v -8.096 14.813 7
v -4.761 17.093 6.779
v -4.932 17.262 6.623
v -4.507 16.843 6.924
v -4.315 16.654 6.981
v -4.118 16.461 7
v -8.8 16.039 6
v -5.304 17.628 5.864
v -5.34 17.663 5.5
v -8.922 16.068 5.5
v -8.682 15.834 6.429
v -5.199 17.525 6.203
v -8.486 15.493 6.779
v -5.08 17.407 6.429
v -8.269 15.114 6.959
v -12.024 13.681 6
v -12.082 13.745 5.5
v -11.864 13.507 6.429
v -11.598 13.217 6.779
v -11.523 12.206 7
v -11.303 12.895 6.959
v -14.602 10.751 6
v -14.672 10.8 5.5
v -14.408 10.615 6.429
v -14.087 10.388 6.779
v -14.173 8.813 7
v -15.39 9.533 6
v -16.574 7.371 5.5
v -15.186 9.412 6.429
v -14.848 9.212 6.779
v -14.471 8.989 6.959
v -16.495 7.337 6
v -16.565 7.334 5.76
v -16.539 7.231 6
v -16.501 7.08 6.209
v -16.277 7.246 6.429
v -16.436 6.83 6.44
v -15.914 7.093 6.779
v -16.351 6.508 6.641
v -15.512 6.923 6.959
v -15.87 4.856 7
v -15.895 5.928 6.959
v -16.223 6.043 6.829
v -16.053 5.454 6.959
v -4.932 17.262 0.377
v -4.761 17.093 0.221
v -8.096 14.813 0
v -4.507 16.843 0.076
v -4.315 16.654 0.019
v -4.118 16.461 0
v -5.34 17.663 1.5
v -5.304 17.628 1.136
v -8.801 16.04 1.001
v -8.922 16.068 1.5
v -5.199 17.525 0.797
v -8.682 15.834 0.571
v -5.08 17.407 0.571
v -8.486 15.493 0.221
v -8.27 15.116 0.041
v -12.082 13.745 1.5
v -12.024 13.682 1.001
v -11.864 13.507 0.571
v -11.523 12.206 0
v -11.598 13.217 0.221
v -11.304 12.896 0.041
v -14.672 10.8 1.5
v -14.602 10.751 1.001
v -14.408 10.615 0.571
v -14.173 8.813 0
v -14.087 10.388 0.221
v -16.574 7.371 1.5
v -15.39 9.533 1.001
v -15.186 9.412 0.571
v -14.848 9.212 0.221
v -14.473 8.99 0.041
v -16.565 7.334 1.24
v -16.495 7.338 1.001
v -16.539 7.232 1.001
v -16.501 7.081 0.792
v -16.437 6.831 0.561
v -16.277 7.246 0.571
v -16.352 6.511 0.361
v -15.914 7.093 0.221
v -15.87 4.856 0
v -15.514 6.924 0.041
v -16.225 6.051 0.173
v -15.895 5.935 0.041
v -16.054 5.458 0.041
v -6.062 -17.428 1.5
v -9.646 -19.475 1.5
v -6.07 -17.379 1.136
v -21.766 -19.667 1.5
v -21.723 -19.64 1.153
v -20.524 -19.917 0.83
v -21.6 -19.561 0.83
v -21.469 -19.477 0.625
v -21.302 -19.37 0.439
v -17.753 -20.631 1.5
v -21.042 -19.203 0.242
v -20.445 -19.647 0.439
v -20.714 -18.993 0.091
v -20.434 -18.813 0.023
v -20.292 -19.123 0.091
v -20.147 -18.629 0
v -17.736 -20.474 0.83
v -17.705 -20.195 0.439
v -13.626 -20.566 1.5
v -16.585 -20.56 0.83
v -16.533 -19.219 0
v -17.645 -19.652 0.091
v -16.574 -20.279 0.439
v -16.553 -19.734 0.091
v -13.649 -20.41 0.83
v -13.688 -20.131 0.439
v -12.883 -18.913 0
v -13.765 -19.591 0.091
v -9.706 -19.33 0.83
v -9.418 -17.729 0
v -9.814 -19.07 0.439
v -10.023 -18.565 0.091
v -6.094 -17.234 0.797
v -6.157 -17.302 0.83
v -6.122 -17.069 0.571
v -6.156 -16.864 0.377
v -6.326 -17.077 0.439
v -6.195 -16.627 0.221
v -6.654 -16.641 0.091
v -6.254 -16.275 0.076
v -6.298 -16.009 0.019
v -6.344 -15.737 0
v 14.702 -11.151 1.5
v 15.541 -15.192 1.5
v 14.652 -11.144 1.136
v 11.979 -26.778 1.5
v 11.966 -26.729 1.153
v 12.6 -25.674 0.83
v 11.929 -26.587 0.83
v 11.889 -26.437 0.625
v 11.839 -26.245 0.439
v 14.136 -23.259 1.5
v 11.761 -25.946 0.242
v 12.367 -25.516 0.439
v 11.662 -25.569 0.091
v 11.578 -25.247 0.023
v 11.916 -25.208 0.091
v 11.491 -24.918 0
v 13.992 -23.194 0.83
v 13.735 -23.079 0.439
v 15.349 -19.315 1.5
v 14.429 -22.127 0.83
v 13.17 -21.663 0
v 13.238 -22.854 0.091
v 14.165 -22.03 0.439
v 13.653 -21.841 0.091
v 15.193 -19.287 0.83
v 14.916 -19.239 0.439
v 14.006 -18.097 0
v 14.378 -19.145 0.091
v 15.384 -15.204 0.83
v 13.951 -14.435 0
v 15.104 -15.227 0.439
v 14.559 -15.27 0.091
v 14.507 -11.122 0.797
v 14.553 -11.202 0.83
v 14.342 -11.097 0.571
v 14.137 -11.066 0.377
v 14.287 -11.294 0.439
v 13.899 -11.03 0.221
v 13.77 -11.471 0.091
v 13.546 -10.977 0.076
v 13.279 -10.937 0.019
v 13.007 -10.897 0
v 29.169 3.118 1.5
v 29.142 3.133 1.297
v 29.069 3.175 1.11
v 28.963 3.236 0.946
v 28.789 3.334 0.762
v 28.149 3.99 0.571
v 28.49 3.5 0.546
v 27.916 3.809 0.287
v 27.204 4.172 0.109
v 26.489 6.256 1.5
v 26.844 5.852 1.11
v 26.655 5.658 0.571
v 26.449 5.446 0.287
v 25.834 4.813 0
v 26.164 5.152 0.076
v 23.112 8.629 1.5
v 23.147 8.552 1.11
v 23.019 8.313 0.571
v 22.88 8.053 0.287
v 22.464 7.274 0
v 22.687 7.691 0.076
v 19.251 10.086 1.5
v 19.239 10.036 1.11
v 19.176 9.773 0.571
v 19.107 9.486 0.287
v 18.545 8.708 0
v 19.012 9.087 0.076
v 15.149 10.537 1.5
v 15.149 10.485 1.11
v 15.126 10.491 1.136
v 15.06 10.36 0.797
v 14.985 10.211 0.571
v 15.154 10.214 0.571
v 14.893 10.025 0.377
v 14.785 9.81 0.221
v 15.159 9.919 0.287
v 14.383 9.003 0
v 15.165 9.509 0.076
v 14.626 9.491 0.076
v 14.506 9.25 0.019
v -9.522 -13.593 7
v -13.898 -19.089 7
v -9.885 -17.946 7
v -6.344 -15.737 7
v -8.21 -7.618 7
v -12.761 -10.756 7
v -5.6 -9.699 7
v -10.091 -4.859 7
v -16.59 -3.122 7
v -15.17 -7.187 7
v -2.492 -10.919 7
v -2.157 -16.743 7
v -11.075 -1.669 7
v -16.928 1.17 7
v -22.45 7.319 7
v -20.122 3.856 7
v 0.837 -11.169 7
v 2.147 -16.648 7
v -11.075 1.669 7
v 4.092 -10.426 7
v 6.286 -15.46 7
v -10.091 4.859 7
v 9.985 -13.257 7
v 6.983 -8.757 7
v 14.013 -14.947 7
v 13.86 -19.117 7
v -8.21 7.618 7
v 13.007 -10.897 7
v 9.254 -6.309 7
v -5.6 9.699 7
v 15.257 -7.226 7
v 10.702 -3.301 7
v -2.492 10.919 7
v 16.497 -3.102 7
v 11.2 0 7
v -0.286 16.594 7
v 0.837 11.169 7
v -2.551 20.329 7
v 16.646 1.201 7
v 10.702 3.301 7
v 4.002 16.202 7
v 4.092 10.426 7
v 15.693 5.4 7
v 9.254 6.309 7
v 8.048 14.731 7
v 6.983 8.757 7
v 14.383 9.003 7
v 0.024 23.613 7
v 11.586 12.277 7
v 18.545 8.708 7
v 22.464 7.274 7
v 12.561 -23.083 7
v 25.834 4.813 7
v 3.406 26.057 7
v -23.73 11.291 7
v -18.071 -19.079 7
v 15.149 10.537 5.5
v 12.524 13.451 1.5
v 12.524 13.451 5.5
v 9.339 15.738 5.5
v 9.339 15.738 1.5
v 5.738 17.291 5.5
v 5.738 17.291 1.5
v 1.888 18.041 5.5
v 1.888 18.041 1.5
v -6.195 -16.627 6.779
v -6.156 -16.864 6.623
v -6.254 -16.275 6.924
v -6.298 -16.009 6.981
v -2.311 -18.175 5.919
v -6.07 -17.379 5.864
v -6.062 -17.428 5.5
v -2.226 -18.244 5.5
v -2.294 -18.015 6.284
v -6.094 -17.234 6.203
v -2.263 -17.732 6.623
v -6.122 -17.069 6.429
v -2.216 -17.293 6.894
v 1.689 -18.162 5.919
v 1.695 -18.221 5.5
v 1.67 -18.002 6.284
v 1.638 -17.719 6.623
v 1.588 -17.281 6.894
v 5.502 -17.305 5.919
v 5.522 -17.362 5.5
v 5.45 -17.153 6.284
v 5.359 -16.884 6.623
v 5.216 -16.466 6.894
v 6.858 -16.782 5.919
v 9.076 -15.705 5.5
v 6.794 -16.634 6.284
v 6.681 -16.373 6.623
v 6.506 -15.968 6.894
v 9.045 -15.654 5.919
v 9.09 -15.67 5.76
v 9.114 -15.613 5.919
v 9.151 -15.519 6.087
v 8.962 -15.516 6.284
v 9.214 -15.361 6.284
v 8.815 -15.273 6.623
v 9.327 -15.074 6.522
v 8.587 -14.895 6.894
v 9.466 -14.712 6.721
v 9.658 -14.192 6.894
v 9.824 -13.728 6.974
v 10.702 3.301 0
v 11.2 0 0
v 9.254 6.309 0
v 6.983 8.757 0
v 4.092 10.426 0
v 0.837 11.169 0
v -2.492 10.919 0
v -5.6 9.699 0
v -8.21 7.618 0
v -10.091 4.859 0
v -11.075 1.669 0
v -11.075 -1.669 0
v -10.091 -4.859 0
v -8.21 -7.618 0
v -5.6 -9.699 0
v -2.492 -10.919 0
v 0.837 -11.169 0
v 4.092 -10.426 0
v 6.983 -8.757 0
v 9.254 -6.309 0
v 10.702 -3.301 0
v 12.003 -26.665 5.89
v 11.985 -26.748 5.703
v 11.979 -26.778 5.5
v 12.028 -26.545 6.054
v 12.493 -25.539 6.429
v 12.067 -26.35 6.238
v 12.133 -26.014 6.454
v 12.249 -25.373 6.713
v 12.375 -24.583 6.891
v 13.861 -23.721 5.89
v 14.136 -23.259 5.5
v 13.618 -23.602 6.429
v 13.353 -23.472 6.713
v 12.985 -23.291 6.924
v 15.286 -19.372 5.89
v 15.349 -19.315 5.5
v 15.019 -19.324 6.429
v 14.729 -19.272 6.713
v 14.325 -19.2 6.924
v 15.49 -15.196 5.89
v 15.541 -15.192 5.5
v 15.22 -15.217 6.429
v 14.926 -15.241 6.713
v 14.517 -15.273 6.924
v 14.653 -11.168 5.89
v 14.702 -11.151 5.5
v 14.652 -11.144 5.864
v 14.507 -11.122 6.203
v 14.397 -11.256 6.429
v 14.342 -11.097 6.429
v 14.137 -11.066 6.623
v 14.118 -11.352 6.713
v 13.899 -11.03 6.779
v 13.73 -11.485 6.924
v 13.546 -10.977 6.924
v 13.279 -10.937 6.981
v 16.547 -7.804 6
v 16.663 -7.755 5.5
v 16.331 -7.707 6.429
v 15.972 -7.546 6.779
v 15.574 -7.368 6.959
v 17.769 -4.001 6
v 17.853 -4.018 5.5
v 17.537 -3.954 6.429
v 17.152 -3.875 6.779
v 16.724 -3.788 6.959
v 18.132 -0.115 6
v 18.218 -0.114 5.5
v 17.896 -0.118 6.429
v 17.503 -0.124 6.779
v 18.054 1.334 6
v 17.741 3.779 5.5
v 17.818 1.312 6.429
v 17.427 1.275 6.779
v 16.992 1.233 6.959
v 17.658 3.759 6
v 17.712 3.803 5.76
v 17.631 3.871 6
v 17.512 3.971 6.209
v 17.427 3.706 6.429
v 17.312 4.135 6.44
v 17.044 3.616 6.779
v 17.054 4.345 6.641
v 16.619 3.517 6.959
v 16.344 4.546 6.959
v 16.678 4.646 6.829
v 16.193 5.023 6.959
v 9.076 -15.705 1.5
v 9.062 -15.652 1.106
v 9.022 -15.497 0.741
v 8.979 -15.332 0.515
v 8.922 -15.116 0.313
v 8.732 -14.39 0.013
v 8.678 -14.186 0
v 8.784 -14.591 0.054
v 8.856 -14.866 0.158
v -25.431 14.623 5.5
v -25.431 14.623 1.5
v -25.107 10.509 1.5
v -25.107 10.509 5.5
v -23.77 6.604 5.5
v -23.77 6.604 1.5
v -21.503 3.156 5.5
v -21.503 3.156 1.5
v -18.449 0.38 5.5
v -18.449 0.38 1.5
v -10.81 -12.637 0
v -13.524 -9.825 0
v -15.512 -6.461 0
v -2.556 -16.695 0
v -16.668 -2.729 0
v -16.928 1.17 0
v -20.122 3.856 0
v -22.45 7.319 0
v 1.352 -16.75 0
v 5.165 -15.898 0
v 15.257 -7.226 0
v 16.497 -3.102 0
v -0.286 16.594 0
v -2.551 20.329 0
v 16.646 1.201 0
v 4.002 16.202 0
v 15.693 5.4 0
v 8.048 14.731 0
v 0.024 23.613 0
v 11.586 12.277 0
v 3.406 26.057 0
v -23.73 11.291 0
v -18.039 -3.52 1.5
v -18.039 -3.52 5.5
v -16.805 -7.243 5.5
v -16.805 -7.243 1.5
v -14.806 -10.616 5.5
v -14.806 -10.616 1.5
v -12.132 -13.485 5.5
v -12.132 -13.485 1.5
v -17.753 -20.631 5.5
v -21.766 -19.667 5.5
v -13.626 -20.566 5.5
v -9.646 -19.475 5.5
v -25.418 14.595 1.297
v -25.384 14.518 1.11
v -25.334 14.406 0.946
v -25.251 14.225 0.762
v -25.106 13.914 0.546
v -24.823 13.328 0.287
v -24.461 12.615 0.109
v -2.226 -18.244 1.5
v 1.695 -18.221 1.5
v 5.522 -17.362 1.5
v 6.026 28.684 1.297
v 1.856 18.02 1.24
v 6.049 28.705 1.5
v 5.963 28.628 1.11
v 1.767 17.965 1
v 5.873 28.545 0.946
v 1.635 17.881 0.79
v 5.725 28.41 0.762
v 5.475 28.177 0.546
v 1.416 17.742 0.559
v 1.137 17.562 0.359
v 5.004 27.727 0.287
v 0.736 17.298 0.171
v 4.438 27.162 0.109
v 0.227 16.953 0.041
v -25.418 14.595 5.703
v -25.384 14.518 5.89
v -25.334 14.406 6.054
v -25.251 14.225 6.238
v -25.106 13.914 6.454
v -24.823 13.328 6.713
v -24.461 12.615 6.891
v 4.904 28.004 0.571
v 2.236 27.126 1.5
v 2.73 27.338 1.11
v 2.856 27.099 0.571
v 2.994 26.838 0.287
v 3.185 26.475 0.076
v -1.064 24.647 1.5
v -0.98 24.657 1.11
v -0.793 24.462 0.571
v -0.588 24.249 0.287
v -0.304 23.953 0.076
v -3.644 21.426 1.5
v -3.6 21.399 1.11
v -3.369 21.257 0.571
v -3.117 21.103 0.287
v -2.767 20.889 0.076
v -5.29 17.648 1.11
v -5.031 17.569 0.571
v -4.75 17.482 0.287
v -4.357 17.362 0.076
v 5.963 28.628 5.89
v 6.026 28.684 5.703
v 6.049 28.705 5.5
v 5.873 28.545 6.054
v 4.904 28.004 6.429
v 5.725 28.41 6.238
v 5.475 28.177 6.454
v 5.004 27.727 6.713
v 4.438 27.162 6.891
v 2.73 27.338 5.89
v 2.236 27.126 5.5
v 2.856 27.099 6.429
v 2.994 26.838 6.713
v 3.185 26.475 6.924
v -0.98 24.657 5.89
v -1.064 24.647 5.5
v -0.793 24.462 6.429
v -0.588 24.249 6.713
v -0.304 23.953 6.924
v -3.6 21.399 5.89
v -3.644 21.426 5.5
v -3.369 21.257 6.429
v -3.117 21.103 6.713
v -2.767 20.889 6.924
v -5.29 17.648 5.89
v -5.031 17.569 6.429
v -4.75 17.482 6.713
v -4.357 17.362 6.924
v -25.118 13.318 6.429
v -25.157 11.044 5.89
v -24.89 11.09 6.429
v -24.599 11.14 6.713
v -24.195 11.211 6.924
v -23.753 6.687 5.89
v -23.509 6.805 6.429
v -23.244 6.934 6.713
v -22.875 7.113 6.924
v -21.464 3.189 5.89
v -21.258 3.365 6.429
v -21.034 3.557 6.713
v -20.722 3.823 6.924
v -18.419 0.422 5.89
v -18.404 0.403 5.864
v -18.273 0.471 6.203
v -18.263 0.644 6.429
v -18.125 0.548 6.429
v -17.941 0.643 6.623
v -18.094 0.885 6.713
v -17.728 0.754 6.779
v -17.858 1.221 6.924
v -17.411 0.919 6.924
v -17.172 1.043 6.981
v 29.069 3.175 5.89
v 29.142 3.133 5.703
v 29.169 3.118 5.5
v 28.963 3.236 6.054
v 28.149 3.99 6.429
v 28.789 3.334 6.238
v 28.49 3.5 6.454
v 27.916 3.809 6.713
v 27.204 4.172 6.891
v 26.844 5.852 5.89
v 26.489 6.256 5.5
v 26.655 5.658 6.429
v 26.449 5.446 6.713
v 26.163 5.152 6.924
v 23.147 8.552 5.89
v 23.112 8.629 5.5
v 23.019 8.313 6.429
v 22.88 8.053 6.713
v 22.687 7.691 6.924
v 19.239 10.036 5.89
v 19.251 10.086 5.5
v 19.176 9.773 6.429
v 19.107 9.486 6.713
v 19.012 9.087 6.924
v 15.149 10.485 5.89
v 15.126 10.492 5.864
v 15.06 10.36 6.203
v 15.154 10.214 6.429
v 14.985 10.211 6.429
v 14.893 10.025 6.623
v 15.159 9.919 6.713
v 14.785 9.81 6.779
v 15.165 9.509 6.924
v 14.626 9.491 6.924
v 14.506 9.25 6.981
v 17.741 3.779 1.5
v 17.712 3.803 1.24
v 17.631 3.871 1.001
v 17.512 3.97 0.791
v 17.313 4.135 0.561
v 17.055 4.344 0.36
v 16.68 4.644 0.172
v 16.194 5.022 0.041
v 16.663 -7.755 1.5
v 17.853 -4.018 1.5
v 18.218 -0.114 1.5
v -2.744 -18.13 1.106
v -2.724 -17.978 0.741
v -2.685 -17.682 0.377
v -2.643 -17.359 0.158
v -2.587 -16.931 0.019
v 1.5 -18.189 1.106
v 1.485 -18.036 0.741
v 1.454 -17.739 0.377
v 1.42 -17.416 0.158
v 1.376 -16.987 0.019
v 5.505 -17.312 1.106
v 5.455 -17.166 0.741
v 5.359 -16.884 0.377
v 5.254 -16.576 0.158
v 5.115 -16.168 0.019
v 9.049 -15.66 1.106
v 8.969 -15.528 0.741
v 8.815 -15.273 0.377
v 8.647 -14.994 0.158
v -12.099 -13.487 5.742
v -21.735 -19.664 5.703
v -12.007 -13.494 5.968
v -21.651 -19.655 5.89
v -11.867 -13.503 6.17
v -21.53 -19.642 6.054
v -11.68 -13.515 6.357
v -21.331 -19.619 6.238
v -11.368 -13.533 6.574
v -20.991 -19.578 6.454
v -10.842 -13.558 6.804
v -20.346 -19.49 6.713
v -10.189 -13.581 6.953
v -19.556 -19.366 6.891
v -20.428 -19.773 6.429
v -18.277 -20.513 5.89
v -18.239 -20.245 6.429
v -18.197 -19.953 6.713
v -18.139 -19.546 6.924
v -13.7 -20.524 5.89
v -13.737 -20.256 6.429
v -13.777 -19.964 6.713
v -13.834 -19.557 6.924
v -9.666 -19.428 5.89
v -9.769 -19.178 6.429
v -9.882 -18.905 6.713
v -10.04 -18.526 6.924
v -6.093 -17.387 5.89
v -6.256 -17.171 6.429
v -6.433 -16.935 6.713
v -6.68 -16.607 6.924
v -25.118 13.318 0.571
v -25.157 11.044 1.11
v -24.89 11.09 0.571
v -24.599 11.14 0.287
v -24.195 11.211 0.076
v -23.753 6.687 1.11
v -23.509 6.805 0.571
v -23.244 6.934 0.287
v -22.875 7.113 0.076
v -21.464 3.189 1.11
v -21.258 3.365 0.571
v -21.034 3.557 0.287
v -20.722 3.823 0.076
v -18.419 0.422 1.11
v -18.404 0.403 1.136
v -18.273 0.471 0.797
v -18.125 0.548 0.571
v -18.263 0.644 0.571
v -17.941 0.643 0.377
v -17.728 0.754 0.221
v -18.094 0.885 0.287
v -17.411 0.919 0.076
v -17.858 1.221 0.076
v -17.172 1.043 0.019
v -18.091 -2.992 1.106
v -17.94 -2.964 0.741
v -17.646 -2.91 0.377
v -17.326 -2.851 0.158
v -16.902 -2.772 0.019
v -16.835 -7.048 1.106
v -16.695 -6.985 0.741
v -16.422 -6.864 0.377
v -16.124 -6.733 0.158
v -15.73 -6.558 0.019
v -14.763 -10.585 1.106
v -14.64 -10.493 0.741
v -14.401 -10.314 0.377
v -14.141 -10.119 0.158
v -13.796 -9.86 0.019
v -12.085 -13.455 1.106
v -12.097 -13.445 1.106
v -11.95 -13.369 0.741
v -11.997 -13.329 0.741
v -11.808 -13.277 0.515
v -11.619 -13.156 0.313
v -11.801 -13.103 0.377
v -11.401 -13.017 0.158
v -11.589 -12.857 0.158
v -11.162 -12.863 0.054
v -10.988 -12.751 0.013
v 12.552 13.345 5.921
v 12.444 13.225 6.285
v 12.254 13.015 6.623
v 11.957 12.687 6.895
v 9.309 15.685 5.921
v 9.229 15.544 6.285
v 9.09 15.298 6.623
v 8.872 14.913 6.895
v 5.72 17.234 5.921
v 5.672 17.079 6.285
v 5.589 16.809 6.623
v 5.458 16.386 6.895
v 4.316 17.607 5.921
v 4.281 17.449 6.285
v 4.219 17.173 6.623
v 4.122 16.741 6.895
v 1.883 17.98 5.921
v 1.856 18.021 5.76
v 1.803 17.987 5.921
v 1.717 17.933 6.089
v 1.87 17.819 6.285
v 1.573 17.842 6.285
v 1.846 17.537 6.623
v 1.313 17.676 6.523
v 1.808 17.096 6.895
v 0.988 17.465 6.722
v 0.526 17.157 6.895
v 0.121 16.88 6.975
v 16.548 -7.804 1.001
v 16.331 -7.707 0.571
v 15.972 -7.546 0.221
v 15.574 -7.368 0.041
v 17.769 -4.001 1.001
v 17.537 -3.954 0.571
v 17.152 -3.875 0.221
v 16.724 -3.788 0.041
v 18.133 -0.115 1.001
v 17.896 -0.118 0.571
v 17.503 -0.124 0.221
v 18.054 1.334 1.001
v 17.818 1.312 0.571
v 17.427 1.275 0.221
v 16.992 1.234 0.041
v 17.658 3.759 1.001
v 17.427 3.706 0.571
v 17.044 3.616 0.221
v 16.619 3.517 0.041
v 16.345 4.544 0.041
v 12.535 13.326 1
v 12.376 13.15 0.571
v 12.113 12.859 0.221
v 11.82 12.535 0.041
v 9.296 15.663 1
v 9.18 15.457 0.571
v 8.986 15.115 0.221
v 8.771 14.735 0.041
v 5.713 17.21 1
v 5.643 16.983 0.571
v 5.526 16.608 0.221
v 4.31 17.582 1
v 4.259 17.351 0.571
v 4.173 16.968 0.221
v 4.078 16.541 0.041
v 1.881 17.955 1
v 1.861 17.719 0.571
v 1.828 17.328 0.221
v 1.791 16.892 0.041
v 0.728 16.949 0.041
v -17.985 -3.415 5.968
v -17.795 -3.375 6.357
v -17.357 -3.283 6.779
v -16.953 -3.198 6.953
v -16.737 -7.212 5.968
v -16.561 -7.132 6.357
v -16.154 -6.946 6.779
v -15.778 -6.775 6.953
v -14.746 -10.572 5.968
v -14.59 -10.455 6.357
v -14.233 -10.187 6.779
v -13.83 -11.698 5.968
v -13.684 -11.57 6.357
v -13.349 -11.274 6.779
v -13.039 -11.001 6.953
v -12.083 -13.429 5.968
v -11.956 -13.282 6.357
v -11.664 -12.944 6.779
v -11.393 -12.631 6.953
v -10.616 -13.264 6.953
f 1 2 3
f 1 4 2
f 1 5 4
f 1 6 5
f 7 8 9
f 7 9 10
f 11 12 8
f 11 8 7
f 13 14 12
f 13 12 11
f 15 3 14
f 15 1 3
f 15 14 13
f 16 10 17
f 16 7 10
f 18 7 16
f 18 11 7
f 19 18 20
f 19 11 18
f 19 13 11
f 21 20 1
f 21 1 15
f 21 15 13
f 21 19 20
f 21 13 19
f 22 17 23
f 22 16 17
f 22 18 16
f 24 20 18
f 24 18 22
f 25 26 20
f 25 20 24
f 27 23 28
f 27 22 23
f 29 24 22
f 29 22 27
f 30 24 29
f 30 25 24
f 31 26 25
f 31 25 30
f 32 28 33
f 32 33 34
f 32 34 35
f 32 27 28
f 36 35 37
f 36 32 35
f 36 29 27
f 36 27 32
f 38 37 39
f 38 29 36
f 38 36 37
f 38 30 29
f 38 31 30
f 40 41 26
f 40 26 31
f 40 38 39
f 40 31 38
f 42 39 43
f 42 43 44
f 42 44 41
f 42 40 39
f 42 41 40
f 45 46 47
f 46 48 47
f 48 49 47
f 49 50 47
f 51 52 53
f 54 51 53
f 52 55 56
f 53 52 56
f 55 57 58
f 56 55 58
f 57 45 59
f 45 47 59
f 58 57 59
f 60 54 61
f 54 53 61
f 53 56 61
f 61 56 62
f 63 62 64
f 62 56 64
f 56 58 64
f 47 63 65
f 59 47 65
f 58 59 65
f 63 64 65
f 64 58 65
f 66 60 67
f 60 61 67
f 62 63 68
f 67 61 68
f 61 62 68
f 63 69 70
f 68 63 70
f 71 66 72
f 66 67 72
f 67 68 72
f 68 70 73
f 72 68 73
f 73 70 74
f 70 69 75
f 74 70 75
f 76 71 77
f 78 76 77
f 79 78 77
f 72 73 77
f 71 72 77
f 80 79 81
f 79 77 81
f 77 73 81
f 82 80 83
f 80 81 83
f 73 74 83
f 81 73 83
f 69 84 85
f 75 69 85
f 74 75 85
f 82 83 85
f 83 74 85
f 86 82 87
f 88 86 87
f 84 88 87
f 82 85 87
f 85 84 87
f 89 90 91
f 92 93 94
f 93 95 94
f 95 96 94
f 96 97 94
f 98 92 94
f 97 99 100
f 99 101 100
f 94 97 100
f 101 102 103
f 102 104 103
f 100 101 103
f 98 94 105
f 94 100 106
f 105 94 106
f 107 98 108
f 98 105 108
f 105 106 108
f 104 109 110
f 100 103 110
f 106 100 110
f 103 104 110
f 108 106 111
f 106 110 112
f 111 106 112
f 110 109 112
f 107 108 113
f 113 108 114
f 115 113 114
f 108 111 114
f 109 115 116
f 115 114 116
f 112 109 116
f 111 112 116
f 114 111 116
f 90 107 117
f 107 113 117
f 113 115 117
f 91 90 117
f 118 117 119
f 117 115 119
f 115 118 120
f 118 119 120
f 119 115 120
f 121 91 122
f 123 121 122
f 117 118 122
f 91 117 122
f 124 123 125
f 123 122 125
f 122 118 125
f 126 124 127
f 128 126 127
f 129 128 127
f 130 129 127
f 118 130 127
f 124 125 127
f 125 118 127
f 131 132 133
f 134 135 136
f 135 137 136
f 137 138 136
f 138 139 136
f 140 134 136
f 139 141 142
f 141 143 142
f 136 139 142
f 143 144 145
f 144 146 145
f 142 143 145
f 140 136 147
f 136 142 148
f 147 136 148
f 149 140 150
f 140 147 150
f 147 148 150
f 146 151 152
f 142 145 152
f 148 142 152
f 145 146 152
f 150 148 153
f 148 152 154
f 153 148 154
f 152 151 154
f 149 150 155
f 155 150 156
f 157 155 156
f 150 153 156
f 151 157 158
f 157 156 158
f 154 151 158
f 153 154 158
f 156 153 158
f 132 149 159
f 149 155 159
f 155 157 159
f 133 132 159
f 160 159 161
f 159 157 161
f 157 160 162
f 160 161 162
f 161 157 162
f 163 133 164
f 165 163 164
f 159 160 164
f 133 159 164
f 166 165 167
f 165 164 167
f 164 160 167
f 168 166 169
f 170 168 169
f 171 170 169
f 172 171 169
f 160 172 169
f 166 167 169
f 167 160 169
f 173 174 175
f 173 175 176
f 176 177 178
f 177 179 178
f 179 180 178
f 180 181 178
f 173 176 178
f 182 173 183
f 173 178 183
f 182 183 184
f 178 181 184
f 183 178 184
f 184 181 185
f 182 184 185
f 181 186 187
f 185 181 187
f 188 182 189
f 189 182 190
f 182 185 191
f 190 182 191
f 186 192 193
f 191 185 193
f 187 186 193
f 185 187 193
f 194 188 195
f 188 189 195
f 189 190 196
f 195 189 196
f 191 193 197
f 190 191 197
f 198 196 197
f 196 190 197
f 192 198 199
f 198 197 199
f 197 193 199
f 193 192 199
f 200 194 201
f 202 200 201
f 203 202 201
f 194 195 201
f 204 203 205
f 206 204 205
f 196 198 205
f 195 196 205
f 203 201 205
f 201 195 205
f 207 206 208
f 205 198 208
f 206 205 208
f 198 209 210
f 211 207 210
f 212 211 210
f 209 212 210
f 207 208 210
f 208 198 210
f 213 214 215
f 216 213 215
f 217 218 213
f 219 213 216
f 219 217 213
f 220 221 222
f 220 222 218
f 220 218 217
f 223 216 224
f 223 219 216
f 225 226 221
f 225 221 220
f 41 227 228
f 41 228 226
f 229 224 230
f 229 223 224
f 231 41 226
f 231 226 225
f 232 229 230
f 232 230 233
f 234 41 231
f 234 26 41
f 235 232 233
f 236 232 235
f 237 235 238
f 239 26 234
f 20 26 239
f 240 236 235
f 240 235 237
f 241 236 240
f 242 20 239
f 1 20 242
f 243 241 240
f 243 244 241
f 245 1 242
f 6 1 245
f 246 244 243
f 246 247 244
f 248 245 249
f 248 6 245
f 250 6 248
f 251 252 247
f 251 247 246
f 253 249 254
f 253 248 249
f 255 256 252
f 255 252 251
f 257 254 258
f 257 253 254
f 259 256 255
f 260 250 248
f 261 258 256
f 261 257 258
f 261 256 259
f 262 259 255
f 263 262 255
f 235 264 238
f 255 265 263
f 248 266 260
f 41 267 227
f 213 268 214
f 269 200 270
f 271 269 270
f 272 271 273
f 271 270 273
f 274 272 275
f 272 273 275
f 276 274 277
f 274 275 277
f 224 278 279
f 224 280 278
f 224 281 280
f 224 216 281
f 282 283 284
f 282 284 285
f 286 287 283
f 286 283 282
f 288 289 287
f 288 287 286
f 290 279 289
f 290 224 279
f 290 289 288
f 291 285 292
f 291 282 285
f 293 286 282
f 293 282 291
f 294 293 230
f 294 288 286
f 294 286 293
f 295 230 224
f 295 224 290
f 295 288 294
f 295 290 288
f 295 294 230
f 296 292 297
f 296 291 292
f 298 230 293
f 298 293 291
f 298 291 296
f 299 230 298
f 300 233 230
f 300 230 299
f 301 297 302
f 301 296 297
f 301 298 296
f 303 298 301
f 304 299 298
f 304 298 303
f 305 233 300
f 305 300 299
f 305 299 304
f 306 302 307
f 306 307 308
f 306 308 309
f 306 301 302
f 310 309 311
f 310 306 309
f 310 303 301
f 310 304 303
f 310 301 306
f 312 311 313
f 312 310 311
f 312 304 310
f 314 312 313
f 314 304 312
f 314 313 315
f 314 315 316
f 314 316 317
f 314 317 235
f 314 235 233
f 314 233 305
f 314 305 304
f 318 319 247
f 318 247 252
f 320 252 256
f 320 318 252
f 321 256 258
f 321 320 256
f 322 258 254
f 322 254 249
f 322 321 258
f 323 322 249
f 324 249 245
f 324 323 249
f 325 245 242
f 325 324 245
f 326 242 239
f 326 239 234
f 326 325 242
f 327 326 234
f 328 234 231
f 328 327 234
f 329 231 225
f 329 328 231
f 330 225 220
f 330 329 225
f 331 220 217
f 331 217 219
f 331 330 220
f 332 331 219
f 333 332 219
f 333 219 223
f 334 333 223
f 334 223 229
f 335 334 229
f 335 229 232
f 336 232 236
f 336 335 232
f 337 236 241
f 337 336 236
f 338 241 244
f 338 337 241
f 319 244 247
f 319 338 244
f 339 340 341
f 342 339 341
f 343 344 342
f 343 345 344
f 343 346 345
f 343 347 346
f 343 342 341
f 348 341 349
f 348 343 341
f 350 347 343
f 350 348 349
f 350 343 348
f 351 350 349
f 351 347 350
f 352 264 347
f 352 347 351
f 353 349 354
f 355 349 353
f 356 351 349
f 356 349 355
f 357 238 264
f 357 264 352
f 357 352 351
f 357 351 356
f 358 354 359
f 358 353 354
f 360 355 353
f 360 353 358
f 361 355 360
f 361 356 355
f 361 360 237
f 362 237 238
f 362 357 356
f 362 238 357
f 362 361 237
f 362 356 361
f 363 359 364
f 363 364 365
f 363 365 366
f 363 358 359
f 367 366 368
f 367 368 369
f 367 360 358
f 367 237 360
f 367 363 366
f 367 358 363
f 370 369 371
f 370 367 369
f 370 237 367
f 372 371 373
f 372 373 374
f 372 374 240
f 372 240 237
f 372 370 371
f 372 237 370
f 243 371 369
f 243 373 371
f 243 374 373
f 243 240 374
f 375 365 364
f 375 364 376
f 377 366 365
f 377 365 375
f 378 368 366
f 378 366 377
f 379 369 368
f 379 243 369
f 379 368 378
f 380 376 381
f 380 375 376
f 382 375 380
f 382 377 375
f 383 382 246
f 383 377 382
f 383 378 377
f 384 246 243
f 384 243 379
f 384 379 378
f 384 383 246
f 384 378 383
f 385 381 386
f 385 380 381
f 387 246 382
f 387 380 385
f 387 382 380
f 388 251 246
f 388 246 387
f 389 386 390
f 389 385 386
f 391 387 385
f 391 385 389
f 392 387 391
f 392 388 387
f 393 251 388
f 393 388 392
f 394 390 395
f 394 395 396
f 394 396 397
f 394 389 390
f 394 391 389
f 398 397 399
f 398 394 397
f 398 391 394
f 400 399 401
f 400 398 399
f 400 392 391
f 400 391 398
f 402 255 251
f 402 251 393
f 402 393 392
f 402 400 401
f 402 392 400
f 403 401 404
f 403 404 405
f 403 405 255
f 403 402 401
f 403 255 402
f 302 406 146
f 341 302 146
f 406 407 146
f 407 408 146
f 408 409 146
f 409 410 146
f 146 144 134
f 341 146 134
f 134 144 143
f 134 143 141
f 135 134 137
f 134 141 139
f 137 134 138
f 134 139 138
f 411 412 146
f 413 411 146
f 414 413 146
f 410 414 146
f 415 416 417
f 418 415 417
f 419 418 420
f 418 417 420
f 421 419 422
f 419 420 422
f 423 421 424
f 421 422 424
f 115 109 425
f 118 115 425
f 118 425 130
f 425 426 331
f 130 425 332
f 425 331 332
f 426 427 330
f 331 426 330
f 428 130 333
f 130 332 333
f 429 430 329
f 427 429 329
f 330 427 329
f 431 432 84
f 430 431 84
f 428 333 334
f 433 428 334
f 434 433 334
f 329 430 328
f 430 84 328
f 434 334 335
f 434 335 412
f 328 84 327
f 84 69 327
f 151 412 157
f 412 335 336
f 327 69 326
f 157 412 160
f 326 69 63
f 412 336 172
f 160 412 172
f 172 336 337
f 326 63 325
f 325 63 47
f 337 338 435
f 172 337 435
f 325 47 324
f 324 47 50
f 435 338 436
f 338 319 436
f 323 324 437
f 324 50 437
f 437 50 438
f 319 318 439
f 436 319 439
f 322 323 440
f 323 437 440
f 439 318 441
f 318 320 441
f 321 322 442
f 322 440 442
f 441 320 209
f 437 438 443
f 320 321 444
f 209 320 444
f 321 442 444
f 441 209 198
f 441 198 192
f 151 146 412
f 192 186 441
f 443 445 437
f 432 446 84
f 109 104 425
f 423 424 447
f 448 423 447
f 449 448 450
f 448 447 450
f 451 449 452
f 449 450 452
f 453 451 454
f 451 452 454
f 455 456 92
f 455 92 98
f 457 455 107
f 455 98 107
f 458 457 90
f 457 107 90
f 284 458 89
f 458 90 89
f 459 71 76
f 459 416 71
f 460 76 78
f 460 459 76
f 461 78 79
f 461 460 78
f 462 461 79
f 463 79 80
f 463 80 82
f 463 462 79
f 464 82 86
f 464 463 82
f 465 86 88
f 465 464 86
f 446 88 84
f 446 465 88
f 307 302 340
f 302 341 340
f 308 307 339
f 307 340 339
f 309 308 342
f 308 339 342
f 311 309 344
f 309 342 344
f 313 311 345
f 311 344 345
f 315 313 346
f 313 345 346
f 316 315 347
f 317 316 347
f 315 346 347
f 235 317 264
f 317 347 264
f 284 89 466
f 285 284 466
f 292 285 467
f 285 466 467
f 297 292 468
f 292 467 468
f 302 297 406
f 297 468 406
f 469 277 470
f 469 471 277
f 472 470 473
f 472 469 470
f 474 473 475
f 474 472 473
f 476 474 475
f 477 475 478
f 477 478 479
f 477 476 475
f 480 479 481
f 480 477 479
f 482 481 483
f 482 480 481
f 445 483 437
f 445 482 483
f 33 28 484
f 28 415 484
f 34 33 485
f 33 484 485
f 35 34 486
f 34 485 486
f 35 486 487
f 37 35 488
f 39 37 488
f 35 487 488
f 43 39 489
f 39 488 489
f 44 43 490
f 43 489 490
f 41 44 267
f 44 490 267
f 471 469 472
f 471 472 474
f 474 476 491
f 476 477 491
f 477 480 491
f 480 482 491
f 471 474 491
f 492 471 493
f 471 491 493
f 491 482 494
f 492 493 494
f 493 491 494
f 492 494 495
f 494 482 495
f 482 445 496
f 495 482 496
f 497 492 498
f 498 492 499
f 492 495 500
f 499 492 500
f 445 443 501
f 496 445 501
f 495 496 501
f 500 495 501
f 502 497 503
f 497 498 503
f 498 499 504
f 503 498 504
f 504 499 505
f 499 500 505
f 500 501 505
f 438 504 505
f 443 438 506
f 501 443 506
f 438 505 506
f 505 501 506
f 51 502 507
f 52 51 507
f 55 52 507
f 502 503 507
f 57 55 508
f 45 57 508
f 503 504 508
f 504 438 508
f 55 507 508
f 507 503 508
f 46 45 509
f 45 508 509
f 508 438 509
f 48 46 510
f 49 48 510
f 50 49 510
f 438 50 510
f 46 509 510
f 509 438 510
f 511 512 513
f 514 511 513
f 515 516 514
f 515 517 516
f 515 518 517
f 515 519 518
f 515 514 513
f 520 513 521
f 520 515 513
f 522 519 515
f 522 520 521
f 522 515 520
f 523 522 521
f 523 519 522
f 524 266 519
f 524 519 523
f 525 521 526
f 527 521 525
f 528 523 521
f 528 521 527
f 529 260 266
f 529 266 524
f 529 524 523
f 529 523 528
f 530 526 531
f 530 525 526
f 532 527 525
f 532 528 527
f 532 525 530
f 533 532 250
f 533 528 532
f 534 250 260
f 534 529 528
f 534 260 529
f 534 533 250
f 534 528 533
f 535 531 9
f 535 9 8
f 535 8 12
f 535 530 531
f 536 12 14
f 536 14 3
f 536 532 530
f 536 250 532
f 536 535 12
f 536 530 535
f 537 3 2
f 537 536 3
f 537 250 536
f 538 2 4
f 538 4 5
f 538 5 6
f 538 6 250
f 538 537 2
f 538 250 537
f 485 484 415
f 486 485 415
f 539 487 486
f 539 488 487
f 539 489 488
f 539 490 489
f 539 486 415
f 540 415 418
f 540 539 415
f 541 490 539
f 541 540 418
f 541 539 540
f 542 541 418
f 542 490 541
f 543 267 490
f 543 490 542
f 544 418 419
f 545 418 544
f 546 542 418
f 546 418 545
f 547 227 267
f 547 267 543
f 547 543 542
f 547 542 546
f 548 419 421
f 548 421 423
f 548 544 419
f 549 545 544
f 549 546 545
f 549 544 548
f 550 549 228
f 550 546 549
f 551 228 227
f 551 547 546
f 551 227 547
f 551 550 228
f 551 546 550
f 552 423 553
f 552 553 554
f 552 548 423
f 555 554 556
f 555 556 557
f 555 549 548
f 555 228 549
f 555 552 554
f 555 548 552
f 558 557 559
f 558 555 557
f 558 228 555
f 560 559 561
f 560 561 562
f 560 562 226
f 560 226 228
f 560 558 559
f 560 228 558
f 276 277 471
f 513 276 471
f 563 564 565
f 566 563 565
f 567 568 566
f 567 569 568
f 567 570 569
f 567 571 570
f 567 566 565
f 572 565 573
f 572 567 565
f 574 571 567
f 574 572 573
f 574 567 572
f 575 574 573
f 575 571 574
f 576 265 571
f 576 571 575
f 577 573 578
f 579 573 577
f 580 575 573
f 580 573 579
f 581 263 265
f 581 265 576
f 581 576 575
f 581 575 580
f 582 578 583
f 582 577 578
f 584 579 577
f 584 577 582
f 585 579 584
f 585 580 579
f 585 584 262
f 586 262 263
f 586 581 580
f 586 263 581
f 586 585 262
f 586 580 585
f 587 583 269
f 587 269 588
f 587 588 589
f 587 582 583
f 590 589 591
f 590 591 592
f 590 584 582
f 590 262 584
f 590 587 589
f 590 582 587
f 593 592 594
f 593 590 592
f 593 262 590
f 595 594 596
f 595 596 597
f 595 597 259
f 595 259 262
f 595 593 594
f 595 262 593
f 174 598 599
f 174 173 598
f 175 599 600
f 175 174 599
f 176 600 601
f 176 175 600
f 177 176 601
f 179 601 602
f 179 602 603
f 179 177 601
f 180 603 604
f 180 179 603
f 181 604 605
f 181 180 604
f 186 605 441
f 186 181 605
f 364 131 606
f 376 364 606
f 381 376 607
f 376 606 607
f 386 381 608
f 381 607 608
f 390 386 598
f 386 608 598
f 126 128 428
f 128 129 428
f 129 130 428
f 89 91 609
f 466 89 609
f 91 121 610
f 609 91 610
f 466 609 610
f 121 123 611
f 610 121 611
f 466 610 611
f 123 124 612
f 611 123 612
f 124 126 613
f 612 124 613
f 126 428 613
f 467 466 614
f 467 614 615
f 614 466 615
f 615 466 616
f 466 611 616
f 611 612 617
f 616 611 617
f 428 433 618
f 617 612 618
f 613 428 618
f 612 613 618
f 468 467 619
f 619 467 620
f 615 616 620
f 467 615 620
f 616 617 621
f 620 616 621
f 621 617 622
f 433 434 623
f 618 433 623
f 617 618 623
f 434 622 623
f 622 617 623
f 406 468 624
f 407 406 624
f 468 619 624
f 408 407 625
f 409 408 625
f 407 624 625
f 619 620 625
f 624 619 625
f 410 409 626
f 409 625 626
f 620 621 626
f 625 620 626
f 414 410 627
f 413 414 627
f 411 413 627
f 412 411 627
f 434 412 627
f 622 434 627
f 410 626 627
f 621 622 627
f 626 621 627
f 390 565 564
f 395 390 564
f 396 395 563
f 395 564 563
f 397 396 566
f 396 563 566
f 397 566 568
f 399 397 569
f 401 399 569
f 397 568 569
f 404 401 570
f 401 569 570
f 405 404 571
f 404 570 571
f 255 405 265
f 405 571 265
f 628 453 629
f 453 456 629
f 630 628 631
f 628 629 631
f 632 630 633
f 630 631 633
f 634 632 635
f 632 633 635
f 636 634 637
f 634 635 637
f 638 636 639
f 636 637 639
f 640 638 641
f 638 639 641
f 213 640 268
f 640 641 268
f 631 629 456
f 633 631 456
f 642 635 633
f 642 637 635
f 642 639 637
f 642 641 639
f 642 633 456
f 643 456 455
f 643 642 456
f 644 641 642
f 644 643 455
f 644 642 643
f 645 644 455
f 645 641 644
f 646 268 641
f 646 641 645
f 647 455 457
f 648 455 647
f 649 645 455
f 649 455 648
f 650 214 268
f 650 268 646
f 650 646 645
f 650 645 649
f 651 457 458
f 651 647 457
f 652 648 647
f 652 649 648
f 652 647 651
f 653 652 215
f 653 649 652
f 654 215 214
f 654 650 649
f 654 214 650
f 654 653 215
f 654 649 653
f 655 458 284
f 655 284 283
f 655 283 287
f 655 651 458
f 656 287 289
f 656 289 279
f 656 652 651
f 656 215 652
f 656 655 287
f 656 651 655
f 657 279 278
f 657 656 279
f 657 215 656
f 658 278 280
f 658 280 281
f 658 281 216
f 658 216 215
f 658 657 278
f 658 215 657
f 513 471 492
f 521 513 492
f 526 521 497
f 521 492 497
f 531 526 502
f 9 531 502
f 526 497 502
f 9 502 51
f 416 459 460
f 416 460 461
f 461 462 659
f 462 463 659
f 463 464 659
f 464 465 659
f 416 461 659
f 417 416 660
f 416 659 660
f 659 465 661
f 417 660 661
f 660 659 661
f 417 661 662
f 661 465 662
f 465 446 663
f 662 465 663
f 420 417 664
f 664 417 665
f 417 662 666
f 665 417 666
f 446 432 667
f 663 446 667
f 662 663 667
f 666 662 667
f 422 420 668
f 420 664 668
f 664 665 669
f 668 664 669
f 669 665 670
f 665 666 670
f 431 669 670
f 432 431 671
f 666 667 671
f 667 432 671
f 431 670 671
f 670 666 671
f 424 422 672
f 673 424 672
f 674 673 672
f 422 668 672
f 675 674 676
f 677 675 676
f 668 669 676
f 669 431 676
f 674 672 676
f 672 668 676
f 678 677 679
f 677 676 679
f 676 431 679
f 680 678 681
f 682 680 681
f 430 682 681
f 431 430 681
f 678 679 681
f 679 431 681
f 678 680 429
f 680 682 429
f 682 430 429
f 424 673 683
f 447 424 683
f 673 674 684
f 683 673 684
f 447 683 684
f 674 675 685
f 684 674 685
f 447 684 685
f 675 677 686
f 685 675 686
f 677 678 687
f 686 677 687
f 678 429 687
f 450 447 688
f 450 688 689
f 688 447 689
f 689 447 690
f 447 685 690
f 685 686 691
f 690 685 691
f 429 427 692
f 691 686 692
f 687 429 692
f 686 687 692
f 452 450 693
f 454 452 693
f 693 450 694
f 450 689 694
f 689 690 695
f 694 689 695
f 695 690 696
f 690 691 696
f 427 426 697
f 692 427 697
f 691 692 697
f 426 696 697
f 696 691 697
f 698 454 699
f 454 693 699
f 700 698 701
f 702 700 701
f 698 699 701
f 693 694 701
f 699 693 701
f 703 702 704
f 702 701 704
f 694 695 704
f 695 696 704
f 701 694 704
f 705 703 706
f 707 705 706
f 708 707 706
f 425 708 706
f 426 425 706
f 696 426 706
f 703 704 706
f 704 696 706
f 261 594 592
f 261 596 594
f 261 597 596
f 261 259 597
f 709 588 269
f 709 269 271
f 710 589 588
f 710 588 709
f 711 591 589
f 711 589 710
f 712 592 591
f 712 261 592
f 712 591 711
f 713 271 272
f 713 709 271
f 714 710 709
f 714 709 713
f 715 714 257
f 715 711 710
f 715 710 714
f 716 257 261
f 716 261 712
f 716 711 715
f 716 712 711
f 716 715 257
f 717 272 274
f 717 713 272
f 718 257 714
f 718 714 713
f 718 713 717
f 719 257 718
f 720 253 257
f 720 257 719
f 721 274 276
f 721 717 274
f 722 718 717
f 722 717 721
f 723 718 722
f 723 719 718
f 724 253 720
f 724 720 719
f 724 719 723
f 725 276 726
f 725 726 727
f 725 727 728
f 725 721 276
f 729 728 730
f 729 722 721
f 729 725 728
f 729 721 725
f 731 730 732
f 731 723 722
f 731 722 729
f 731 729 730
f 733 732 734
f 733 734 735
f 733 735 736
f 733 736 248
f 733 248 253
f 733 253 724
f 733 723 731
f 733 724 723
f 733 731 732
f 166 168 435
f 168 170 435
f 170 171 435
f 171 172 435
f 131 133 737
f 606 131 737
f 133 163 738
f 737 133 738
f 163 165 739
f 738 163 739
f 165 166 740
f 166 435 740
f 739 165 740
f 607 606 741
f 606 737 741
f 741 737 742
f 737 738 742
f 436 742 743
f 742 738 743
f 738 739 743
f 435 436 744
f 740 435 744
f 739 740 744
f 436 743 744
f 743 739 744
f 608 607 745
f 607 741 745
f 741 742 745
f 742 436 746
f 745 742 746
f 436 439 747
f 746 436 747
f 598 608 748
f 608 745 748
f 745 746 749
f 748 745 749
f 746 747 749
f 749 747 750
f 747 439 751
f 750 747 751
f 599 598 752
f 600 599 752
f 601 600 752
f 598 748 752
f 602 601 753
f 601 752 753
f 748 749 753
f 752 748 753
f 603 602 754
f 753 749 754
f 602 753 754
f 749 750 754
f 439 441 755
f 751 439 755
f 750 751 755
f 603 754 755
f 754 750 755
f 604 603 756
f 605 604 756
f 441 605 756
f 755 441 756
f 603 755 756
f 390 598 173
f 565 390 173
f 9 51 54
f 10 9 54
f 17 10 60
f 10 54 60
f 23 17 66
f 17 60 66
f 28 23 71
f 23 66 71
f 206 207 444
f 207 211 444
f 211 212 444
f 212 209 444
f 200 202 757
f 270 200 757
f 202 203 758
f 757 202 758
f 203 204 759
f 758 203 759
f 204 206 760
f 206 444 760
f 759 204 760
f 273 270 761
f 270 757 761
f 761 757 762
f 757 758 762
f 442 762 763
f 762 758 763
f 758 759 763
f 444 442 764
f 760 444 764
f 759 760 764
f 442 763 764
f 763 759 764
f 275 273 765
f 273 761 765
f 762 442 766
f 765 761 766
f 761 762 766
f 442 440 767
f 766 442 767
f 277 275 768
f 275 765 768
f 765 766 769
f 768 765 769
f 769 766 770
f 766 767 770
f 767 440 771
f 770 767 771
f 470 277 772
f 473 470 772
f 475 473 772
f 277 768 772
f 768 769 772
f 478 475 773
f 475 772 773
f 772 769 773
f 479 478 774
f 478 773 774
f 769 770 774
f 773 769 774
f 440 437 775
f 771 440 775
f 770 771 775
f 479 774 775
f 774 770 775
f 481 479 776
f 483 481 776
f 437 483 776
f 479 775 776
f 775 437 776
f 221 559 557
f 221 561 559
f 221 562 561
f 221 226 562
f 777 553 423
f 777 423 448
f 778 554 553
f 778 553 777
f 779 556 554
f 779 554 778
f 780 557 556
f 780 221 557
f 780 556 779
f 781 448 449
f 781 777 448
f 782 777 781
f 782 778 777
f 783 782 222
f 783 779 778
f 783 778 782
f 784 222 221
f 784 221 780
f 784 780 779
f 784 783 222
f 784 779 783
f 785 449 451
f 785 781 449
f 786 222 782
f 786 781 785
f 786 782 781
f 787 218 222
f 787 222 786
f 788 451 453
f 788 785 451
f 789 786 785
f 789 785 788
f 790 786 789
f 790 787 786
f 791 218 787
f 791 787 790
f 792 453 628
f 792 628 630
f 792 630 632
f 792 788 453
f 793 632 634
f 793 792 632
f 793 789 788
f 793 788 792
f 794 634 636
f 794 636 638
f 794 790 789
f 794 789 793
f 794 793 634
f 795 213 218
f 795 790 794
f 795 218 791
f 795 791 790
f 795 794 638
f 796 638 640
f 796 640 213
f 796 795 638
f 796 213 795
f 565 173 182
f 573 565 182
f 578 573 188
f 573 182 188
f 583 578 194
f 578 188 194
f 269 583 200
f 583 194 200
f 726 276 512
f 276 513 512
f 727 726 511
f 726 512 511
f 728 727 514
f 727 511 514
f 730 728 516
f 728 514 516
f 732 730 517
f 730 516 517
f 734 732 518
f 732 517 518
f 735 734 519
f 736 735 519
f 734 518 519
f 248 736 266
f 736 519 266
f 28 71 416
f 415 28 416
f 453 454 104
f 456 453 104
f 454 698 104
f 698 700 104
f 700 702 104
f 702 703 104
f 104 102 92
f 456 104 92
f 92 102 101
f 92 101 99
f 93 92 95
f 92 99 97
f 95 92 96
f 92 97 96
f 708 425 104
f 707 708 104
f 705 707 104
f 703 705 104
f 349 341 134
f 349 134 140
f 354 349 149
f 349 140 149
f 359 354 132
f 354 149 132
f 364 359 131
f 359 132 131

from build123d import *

# Parameters (mm, degrees)
F0_R     = 11.2
F1_DEPTH = 7
F2_R     = 1.5


with BuildPart() as f1:
    # F0 (on Top) → F1 (new body)
    with BuildSketch(Plane.XY):
        with BuildLine():
            Line((1.888376, 18.040571), (6.048676, 28.70488))
            ThreePointArc((6.048676, 28.70488), (-1.064452, 24.647482), (-5.33977, 17.663163))
            ThreePointArc((-5.33977, 17.663163), (-12.081682, 13.74468), (-16.574063, 7.370796))
            Line((-16.574063, 7.370796), (-25.430819, 14.622928))
            ThreePointArc((-25.430819, 14.622928), (-23.770082, 6.604137), (-18.448746, 0.379795))
            ThreePointArc((-18.448746, 0.379795), (-16.805413, -7.243023), (-12.13171, -13.485169))
            Line((-12.13171, -13.485169), (-21.765786, -19.667413))
            ThreePointArc((-21.765786, -19.667413), (-13.626267, -20.565901), (-6.062182, -17.428437))
            ThreePointArc((-6.062182, -17.428437), (1.695366, -18.221114), (9.076253, -15.705089))
            Line((9.076253, -15.705089), (11.978824, -26.778058))
            ThreePointArc((11.978824, -26.778058), (15.348587, -19.314563), (14.702111, -11.151161))
            ThreePointArc((14.702111, -11.151161), (17.853206, -4.018245), (17.741143, 3.778891))
            Line((17.741143, 3.778891), (29.169107, 3.117663))
            ThreePointArc((29.169107, 3.117663), (23.112215, 8.628845), (15.148586, 10.53664))
            ThreePointArc((15.148586, 10.53664), (9.338523, 15.737702), (1.888376, 18.040571))
        make_face()
        Circle(F0_R, mode=Mode.SUBTRACT)
    extrude(amount=F1_DEPTH)

    # F2
    f2_edges = [f1.edges().sort_by_distance(p)[0] for p in [
        (-13.626267, -20.565901, 7),
        (1.695366, -18.221114, 7),
        (15.348587, -19.314563, 7),
        (10.527539, -21.241573, 7),
        (17.853206, -4.018245, 7),
        (23.112215, 8.628845, 7),
        (23.455125, 3.448277, 7),
        (9.338523, 15.737702, 7),
        (-1.064452, 24.647482, 7),
        (3.968526, 23.372726, 7),
        (-12.081682, 13.74468, 7),
        (-21.002441, 10.996862, 7),
        (-23.770082, 6.604137, 7),
        (-16.805413, -7.243023, 7),
        (-16.948748, -16.576291, 7),
        (15.348587, -19.314563, 0),
        (17.853206, -4.018245, 0),
        (23.455125, 3.448277, 0),
        (1.695366, -18.221114, 0),
        (-13.626267, -20.565901, 0),
        (-16.805413, -7.243023, 0),
        (-23.770082, 6.604137, 0),
        (-12.081682, 13.74468, 0),
        (-21.002441, 10.996862, 0),
        (-1.064452, 24.647482, 0),
        (3.968526, 23.372726, 0),
        (23.112215, 8.628845, 0),
        (9.338523, 15.737702, 0),
    ]]
    fillet(f2_edges, radius=F2_R)


solid = f1.part
